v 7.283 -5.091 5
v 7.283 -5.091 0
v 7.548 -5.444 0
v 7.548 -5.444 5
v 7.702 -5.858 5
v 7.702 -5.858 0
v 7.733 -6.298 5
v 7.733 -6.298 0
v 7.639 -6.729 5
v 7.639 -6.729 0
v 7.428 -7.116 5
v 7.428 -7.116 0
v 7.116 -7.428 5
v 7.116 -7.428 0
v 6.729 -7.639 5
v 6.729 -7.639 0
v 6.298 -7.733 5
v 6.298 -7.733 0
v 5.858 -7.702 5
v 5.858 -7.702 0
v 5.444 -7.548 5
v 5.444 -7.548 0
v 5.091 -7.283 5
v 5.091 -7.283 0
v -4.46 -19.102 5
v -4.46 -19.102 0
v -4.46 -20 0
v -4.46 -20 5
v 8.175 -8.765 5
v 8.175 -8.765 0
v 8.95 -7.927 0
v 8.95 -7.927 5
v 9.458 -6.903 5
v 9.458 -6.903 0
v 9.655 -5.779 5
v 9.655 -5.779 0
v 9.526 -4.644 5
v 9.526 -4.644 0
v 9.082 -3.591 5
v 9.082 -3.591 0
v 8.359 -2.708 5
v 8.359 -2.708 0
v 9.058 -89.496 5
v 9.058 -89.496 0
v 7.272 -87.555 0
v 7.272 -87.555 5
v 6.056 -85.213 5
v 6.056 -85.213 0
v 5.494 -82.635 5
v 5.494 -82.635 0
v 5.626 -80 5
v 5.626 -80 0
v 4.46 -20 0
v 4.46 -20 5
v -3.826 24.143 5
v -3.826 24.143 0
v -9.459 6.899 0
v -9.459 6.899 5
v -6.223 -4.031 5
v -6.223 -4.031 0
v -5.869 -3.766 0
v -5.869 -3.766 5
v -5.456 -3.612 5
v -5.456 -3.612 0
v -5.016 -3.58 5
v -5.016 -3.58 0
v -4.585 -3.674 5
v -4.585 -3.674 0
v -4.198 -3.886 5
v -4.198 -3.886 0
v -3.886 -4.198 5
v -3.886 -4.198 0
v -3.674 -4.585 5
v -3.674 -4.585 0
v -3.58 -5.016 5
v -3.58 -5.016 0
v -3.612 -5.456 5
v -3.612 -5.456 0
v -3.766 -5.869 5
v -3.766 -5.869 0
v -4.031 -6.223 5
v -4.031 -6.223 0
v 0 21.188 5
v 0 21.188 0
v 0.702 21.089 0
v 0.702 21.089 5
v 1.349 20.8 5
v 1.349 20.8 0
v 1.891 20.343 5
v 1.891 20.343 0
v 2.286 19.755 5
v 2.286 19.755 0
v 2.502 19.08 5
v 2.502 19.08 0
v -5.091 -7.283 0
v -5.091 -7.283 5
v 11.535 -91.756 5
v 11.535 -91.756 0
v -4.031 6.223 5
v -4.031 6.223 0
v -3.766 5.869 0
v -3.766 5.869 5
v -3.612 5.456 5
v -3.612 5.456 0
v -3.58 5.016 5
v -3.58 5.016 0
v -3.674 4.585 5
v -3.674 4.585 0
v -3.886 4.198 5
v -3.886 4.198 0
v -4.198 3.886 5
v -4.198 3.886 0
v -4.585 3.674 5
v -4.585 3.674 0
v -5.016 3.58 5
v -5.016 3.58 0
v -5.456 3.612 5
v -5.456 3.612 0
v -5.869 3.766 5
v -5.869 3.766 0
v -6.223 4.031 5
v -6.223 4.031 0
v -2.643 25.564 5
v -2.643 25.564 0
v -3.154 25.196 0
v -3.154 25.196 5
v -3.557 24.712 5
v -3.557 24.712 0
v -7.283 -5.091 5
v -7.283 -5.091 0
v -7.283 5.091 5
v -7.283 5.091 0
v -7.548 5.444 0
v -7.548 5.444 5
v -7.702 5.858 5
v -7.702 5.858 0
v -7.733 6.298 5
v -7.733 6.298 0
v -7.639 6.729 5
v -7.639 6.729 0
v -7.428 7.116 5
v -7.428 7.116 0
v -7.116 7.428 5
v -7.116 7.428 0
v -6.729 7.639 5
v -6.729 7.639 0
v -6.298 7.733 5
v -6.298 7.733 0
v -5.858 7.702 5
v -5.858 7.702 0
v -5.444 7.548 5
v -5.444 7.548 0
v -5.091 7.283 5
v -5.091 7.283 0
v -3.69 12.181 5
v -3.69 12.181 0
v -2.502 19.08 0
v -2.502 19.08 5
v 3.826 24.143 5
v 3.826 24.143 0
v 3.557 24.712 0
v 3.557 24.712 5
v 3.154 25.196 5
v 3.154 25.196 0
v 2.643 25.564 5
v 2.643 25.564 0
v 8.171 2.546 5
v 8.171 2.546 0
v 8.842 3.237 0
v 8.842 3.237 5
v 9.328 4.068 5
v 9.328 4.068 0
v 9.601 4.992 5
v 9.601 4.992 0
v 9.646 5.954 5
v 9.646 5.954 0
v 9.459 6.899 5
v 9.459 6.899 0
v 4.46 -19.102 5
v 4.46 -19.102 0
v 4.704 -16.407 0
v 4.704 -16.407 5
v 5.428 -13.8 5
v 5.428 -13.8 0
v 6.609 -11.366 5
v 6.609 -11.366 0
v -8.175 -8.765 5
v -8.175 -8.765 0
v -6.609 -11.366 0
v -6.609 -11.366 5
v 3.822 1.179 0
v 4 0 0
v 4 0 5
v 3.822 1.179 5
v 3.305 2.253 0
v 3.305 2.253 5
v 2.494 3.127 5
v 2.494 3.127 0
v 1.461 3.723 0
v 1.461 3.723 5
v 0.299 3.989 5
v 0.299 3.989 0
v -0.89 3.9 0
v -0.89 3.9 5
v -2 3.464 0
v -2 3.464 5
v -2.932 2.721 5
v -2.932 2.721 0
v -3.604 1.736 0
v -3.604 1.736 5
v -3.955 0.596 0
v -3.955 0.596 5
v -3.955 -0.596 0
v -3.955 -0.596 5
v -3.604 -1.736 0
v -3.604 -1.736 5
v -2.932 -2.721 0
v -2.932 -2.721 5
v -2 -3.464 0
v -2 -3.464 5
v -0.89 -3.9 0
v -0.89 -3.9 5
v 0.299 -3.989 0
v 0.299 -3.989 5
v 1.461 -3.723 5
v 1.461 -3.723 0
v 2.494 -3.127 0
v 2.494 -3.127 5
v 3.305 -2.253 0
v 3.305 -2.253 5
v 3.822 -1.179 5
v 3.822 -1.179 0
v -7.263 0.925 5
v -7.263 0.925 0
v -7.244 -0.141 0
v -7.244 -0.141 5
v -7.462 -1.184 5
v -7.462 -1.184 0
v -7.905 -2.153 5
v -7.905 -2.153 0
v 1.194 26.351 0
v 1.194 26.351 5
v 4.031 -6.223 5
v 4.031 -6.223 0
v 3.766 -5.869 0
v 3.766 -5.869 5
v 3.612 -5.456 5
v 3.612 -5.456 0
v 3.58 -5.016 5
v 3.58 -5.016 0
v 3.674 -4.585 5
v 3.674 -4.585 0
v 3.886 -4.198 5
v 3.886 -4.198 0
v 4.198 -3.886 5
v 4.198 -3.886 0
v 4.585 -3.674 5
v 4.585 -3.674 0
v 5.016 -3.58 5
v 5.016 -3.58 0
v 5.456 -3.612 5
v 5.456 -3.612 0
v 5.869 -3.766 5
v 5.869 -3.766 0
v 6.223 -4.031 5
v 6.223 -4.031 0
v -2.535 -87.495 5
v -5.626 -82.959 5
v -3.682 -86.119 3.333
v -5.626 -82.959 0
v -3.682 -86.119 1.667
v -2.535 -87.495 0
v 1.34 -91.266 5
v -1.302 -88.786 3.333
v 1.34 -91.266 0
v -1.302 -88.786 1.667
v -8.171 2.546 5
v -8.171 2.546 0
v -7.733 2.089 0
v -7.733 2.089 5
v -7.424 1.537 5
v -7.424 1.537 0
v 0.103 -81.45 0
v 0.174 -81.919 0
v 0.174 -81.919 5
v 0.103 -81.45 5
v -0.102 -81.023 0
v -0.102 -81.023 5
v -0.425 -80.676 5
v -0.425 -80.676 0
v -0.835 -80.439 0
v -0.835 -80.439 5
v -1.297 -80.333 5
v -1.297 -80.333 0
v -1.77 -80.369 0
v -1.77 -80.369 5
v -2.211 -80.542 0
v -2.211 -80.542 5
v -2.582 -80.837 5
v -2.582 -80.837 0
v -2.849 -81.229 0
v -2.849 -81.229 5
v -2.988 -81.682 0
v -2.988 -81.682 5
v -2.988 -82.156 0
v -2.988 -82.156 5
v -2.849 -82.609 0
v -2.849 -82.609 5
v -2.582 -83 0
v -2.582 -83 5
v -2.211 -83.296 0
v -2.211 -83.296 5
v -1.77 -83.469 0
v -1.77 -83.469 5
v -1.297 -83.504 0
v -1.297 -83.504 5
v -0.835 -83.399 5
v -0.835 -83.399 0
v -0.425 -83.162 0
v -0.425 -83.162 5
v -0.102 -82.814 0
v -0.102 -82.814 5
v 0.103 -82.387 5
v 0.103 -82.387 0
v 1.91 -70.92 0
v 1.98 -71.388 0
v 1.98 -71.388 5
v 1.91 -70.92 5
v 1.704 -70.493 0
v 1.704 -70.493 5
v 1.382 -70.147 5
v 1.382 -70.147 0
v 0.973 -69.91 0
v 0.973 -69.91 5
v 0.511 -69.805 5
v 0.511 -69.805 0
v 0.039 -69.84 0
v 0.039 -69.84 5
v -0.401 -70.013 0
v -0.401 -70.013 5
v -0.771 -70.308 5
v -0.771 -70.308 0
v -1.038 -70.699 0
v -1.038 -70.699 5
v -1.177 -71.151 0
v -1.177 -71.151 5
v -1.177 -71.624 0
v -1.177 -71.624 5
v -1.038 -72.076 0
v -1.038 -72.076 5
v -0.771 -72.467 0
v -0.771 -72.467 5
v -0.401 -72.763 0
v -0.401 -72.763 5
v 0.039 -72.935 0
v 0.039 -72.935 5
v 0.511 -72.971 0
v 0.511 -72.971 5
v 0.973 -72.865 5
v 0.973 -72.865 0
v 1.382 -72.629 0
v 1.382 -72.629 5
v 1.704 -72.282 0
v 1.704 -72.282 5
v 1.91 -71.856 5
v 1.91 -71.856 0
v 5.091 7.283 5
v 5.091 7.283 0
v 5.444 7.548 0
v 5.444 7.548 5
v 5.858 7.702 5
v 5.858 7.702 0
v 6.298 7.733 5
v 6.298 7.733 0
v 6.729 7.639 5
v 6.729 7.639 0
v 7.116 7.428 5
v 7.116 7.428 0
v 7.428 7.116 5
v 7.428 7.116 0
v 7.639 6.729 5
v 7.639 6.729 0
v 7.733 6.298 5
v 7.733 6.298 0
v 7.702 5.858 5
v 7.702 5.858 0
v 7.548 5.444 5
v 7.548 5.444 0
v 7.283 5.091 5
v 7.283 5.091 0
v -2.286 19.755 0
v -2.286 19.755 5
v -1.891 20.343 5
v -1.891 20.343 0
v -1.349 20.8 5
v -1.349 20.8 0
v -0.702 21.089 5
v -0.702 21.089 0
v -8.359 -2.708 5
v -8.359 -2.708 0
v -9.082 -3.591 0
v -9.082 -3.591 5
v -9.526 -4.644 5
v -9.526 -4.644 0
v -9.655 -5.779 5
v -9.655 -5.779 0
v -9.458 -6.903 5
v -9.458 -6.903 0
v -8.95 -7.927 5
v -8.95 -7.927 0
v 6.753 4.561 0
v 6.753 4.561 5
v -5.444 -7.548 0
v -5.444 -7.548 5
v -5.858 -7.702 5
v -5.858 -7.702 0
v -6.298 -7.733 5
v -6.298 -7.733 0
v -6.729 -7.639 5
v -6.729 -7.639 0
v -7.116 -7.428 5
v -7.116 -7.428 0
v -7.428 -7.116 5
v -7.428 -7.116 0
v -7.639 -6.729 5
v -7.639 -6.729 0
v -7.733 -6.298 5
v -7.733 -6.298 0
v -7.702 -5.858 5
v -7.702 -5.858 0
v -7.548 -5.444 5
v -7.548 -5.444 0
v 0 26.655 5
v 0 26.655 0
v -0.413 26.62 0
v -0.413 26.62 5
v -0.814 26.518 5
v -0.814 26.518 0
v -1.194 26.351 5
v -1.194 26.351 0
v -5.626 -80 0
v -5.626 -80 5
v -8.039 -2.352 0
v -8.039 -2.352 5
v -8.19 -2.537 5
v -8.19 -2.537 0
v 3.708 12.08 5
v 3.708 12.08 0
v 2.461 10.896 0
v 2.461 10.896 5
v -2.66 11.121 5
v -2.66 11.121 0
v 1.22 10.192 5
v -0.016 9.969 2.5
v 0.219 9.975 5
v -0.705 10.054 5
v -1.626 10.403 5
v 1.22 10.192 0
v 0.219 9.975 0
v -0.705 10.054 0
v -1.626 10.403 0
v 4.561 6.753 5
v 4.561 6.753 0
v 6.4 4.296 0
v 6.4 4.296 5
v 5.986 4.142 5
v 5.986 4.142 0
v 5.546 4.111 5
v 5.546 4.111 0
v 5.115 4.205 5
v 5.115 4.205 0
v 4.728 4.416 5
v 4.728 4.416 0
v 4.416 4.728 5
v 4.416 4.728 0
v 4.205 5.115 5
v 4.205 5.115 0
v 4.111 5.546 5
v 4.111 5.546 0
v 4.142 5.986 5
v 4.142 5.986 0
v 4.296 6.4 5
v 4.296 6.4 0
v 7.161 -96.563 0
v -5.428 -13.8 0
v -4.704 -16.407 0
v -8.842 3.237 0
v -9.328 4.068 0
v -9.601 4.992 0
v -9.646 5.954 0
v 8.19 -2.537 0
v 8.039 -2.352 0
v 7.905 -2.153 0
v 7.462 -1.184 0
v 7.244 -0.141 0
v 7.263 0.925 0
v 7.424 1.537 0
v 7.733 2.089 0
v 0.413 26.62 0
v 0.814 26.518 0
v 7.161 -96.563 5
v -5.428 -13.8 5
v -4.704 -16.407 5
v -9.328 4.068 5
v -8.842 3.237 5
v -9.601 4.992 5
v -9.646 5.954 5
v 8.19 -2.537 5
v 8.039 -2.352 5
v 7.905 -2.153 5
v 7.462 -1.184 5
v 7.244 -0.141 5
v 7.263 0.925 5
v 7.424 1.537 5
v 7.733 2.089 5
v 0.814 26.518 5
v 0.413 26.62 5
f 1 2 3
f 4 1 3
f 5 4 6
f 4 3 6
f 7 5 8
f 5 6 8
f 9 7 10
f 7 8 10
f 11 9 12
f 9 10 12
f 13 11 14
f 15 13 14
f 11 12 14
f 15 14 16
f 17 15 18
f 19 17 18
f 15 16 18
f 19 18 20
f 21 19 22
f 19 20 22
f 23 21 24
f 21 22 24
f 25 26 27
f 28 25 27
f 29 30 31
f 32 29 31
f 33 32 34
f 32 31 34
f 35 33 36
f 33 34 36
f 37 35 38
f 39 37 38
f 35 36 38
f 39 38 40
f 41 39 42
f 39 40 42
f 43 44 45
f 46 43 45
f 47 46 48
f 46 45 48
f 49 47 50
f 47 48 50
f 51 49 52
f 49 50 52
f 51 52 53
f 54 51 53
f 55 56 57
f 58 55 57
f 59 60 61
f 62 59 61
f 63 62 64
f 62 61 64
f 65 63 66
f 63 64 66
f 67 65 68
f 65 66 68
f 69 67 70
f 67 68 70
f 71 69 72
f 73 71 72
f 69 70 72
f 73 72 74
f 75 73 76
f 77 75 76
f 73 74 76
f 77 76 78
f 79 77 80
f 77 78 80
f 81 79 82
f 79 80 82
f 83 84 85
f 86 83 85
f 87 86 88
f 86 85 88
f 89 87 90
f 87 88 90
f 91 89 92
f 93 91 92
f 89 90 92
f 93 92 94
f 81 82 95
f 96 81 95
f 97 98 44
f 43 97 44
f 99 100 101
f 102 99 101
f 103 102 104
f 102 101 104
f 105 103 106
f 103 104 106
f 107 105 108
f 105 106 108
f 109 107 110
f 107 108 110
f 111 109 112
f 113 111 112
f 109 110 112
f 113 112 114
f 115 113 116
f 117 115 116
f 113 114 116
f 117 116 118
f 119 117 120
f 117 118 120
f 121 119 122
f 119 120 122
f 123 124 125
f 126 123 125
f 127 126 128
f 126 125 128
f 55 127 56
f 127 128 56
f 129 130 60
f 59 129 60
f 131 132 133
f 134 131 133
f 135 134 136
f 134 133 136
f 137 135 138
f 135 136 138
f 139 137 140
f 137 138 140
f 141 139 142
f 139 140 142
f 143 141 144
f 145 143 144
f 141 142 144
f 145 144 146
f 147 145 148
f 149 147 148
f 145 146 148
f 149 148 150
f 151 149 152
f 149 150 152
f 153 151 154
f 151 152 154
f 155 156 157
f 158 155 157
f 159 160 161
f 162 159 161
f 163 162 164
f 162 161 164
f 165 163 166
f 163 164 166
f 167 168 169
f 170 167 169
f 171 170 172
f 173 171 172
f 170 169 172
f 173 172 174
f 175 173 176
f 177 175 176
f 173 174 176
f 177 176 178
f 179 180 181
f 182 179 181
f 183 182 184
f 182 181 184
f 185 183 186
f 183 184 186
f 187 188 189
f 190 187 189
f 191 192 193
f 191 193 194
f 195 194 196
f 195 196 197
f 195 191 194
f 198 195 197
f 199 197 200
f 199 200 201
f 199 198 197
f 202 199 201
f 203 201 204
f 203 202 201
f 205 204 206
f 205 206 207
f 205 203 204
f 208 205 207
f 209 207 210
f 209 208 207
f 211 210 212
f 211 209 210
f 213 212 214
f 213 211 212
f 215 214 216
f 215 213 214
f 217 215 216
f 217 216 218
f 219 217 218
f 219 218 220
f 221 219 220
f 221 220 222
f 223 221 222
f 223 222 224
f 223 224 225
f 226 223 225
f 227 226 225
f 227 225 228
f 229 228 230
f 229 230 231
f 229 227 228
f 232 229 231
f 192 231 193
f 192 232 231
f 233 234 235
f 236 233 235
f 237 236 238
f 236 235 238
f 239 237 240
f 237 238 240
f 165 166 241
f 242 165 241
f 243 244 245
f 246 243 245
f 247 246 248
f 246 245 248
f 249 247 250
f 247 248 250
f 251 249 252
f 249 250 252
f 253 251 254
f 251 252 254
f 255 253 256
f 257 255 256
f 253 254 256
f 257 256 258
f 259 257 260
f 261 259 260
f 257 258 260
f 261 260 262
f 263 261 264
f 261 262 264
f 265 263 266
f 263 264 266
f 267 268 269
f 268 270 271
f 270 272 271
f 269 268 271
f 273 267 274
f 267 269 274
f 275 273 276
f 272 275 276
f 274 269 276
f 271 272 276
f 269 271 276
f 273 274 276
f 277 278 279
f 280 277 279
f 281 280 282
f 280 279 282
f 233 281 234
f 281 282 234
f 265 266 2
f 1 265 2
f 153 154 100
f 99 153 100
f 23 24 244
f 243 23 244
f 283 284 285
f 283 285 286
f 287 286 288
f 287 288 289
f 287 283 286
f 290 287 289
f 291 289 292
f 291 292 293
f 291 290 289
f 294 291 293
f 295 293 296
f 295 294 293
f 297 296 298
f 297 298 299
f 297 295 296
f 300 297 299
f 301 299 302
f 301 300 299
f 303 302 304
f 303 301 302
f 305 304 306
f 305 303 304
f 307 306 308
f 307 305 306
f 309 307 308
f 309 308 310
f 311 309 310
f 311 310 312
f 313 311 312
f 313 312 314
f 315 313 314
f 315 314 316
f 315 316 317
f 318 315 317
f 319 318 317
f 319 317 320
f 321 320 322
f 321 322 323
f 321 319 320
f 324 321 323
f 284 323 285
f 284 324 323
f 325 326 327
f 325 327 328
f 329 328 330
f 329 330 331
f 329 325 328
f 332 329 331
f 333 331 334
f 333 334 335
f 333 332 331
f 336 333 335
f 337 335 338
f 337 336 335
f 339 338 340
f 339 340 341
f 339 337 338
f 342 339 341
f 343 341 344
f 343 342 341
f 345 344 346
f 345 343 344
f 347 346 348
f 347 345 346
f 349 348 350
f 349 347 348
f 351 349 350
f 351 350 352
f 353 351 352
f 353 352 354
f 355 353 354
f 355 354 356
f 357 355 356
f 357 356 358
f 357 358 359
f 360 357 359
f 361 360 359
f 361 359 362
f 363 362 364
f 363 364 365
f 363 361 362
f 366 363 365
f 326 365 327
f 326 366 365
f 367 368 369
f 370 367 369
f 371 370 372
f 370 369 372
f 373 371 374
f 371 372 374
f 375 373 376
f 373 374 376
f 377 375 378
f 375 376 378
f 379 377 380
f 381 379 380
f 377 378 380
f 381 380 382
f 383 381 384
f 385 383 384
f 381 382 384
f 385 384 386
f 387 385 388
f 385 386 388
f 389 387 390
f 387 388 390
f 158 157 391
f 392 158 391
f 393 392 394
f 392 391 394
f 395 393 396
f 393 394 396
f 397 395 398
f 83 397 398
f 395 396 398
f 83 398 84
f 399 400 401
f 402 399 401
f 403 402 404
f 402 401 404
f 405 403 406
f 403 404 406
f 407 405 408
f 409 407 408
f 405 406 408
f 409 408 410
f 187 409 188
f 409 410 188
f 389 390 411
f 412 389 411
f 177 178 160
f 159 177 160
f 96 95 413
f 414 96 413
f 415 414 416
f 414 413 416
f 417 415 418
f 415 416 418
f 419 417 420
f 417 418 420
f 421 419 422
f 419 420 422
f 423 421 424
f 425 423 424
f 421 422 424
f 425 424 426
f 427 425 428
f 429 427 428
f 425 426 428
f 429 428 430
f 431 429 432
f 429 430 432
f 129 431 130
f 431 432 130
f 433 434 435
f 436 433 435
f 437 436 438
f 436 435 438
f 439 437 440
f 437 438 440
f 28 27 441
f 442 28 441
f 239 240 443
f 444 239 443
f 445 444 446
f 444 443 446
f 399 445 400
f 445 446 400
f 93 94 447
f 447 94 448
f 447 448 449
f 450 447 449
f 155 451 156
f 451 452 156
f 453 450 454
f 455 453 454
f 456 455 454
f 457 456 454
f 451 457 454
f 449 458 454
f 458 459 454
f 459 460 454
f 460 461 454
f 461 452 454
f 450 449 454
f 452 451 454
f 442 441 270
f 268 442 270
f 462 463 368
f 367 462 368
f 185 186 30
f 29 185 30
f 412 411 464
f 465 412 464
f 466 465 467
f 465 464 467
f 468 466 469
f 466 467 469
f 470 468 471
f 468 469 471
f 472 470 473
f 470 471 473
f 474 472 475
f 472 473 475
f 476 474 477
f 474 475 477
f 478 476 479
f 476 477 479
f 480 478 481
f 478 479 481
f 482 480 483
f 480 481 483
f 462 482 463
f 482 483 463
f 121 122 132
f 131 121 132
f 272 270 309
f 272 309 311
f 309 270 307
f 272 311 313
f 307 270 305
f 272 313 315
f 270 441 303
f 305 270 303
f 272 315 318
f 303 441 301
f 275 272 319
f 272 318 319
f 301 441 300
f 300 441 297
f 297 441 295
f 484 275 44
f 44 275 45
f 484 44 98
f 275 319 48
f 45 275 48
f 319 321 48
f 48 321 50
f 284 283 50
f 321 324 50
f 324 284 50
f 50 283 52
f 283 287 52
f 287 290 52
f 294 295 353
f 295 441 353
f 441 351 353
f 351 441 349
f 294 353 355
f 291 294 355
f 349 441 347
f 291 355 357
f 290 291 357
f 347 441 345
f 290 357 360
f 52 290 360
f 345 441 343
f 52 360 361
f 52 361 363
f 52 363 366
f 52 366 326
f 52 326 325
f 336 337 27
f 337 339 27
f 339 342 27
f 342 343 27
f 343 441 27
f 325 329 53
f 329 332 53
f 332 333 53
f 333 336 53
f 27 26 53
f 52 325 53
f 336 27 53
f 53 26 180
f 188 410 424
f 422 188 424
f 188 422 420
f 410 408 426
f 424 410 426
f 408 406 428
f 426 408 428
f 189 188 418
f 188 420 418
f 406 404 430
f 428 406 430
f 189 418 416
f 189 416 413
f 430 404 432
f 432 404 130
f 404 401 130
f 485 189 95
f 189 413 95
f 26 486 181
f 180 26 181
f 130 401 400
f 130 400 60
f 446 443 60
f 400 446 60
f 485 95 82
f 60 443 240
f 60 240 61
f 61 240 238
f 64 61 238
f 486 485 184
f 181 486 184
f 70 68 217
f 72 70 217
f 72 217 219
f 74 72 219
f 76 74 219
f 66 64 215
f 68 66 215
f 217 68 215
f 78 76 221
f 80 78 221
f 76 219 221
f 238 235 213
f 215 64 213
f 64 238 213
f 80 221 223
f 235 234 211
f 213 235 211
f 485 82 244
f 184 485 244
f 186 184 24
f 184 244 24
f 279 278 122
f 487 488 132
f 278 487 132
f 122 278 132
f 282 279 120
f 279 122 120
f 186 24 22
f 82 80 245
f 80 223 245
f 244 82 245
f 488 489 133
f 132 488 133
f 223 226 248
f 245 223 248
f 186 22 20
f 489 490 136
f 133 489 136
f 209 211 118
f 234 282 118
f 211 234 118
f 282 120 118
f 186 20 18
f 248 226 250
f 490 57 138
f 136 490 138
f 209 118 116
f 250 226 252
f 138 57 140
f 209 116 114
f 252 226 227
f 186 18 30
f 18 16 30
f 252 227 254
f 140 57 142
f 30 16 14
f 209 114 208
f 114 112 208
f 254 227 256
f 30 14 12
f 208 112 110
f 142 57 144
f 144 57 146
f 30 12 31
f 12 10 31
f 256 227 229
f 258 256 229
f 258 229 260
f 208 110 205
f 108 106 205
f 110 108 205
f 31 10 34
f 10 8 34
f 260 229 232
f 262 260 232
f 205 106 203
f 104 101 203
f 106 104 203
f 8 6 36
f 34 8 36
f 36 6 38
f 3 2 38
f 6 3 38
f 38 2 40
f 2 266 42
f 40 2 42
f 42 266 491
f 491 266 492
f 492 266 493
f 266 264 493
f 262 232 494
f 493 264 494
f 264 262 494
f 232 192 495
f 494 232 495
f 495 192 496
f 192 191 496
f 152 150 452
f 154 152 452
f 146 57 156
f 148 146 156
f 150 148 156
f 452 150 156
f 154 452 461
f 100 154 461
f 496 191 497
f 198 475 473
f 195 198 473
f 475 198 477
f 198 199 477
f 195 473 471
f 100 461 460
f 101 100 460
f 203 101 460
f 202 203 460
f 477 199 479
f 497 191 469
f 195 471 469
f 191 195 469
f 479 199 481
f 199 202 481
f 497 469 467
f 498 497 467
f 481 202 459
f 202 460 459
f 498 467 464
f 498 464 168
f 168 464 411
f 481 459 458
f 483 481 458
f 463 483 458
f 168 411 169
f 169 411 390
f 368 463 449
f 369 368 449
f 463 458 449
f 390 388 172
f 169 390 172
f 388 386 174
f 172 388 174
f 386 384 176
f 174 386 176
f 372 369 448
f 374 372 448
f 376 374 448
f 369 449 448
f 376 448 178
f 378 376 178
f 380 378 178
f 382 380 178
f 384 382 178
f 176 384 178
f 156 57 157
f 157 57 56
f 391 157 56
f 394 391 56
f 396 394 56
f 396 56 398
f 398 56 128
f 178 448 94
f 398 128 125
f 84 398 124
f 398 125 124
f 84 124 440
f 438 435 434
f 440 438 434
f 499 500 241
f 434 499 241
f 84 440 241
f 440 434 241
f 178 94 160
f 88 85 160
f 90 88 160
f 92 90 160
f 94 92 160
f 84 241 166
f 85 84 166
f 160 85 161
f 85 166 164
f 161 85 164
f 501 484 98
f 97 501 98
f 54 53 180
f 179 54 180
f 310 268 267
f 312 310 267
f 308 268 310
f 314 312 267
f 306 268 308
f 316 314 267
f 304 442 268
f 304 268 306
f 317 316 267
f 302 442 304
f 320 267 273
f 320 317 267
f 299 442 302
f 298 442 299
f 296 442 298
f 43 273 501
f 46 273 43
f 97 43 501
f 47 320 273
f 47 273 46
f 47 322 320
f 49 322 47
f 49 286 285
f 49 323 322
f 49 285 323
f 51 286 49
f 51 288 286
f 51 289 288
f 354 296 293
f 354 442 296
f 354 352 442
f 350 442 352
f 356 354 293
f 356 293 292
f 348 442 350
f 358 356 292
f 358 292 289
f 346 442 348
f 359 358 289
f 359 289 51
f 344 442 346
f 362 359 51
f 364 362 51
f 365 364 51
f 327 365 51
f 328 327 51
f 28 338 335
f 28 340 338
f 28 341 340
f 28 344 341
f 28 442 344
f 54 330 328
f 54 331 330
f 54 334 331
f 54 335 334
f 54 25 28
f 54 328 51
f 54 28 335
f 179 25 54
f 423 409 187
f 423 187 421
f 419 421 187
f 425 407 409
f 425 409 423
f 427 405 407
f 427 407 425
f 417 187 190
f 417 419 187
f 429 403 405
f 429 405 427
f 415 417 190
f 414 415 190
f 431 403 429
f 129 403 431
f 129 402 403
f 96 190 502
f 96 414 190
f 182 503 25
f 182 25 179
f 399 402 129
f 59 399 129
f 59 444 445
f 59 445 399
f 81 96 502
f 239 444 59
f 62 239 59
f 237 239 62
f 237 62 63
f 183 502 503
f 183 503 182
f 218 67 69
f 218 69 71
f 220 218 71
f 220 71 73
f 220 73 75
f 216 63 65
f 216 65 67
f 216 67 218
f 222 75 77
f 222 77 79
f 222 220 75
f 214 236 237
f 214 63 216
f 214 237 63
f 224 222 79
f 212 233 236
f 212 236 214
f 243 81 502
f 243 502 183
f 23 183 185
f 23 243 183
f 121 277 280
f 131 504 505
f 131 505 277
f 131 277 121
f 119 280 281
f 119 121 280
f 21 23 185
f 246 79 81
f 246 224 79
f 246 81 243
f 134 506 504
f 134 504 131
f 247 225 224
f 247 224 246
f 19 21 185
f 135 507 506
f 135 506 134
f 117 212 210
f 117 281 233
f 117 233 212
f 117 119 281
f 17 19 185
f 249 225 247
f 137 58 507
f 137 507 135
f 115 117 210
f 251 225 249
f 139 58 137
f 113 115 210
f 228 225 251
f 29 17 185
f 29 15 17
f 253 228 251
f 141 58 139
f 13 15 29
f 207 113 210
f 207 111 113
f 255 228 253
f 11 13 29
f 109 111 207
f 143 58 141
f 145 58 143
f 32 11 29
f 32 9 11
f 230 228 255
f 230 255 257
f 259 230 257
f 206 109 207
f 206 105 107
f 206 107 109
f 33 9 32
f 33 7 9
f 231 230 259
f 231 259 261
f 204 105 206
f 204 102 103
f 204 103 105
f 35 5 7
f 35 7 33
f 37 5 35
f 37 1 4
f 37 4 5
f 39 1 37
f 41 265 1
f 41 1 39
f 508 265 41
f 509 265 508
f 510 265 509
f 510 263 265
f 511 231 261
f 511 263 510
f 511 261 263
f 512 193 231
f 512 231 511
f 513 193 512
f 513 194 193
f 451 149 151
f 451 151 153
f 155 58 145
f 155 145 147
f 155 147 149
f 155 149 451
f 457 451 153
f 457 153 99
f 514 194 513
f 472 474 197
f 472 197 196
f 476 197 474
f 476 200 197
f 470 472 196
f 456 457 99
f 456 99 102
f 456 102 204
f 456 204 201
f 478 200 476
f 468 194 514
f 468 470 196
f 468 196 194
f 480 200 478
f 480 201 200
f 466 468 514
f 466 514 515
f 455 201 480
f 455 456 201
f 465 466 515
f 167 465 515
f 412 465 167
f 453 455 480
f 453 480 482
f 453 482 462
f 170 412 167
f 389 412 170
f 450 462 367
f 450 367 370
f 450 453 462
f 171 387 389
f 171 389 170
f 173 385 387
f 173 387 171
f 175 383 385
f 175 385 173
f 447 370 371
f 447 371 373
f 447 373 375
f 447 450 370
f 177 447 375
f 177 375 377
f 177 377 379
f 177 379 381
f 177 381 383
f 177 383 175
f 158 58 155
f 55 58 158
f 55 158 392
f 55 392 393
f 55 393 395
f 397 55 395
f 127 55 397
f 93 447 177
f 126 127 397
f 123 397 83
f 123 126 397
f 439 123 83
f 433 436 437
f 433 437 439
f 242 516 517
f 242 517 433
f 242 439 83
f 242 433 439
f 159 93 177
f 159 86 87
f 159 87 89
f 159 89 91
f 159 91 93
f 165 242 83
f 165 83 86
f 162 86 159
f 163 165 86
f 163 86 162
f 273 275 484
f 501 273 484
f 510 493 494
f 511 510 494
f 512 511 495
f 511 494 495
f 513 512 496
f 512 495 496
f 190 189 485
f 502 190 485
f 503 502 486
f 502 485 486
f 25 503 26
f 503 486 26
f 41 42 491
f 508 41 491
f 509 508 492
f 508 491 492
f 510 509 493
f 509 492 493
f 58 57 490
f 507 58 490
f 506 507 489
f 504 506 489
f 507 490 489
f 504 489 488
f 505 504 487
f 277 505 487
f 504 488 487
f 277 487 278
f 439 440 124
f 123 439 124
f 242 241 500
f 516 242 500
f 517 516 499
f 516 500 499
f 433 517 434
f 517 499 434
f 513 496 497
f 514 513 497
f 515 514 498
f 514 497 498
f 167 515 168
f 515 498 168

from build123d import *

# Parameters (mm, degrees)
CROQUIS1_R              = 1.59
CROQUIS1_R_2            = 1.5875
CROQUIS1_R_3            = 4
SALIENTE_EXTRUIR1_DEPTH = 5


with BuildPart() as part:
    # Croquis1 → Saliente-Extruir1 (new body)
    with BuildSketch(Plane.XY):
        with BuildLine():
            ThreePointArc((1.193677036, 26.351337281), (0.615813463, 26.577686227), (0, 26.654718258))
            ThreePointArc((0, 26.654718258), (-0.615813463, 26.577686227), (-1.193677036, 26.351337281))
            Line((-1.193677036, 26.351337281), (-2.643396871, 25.563536913))
            ThreePointArc((-2.643396871, 25.563536913), (-3.37085174, 24.966684186), (-3.826144074, 24.143196083))
            Line((-3.826144074, 24.143196083), (-9.459133033, 6.898899359))
            ThreePointArc((-9.459133033, 6.898899359), (-9.492428214, 4.521789334), (-8.170864273, 2.54562401))
            ThreePointArc((-8.170864273, 2.54562401), (-7.560847643, 1.822599507), (-7.263149059, 0.924679537))
            ThreePointArc((-7.263149059, 0.924679537), (-7.323699332, -0.668363985), (-7.905472696, -2.152612532))
            ThreePointArc((-7.905472696, -2.152612532), (-8.1122929, -2.44647205), (-8.359106022, -2.707644973))
            ThreePointArc((-8.359106022, -2.707644973), (-9.655003955, -5.778505112), (-8.174803271, -8.764897481))
            Line((-8.174803271, -8.764897481), (-6.609038667, -11.365635857))
            ThreePointArc((-6.609038667, -11.365635857), (-5.007106824, -15.087530614), (-4.459817284, -19.102398031))
            Line((-4.459817284, -19.102398031), (-4.459817284, -20))
            Line((-4.459817284, -20), (-5.626230736, -80))
            Line((-5.626230736, -80), (-5.626230736, -82.958659211))
            add(Edge.make_bspline(
                [(-5.626230736, -82.958659211), (-3.957996586, -86.469029482), (-1.373693138, -88.776535361), (1.33959564, -91.266262586)],
                knots=[0, 0, 0, 0, 0.775055833, 0.775055833, 0.775055833, 0.775055833], degree=3))
            Line((1.33959564, -91.266262586), (7.160508284, -96.56338139))
            Line((7.160508284, -96.56338139), (11.535313635, -91.755983118))
            Line((11.535313635, -91.755983118), (9.058275941, -89.496367102))
            ThreePointArc((9.058275941, -89.496367102), (6.055620379, -85.213180579), (5.626230736, -80))
            Line((5.626230736, -80), (4.459817284, -20))
            Line((4.459817284, -20), (4.459817284, -19.102398031))
            ThreePointArc((4.459817284, -19.102398031), (5.007106824, -15.087530614), (6.609038667, -11.365635857))
            Line((6.609038667, -11.365635857), (8.174803271, -8.764897481))
            ThreePointArc((8.174803271, -8.764897481), (9.655003955, -5.778505112), (8.359106022, -2.707644973))
            ThreePointArc((8.359106022, -2.707644973), (8.1122929, -2.44647205), (7.905472696, -2.152612532))
            ThreePointArc((7.905472696, -2.152612532), (7.323699332, -0.668363985), (7.263149059, 0.924679537))
            ThreePointArc((7.263149059, 0.924679537), (7.560847643, 1.822599507), (8.170864273, 2.54562401))
            ThreePointArc((8.170864273, 2.54562401), (9.492428214, 4.521789334), (9.459133033, 6.898899359))
            Line((9.459133033, 6.898899359), (3.826144074, 24.143196083))
            ThreePointArc((3.826144074, 24.143196083), (3.37085174, 24.966684186), (2.643396871, 25.563536913))
            Line((2.643396871, 25.563536913), (1.193677036, 26.351337281))
        make_face()
        with Locations((-1.416184287, -81.918657321)):
            Circle(CROQUIS1_R, mode=Mode.SUBTRACT)
        with Locations((0.39268377, -71.387686118)):
            Circle(CROQUIS1_R_2, mode=Mode.SUBTRACT)
        with BuildLine():
            ThreePointArc((-5.091168825, -7.283199846), (-7.283199846, -7.283199846), (-7.283199846, -5.091168825))
            Line((-7.283199846, -5.091168825), (-6.222539674, -4.030508653))
            ThreePointArc((-6.222539674, -4.030508653), (-4.030508653, -4.030508653), (-4.030508653, -6.222539674))
            Line((-4.030508653, -6.222539674), (-5.091168825, -7.283199846))
        make_face(mode=Mode.SUBTRACT)
        with BuildLine():
            ThreePointArc((-7.283199846, 5.091168825), (-7.283199846, 7.283199846), (-5.091168825, 7.283199846))
            Line((-5.091168825, 7.283199846), (-4.030508653, 6.222539674))
            ThreePointArc((-4.030508653, 6.222539674), (-4.030508653, 4.030508653), (-6.222539674, 4.030508653))
            Line((-6.222539674, 4.030508653), (-7.283199846, 5.091168825))
        make_face(mode=Mode.SUBTRACT)
        Circle(CROQUIS1_R_3, mode=Mode.SUBTRACT)
        with BuildLine():
            Line((-3.690213899, 12.181248638), (-2.502144822, 19.079689902))
            ThreePointArc((-2.502144822, 19.079689902), (-1.635896096, 20.590481825), (0, 21.187744795))
            ThreePointArc((0, 21.187744795), (1.635896096, 20.590481825), (2.502144822, 19.079689902))
            Line((2.502144822, 19.079689902), (3.707704632, 12.079689902))
            add(Edge.make_bspline(
                [(3.707704632, 12.079689902), (-0.039943984, 7.807746472), (-3.690213899, 12.181248638)],
                knots=[0.502108549, 0.502108549, 0.502108549, 1.502108549, 1.502108549, 1.502108549], degree=2))
        make_face(mode=Mode.SUBTRACT)
        with BuildLine():
            ThreePointArc((7.283199846, -5.091168825), (7.283199846, -7.283199846), (5.091168825, -7.283199846))
            Line((5.091168825, -7.283199846), (4.030508653, -6.222539674))
            ThreePointArc((4.030508653, -6.222539674), (4.030508653, -4.030508653), (6.222539674, -4.030508653))
            Line((6.222539674, -4.030508653), (7.283199846, -5.091168825))
        make_face(mode=Mode.SUBTRACT)
        with BuildLine():
            Line((4.560838717, 6.752869739), (5.091168825, 7.283199846))
            ThreePointArc((5.091168825, 7.283199846), (7.283199846, 7.283199846), (7.283199846, 5.091168825))
            Line((7.283199846, 5.091168825), (6.752869872, 4.56083885))
            ThreePointArc((6.752869872, 4.56083885), (4.560838805, 4.560838672), (4.560838717, 6.752869739))
        make_face(mode=Mode.SUBTRACT)
    extrude(amount=SALIENTE_EXTRUIR1_DEPTH)


solid = part.part
